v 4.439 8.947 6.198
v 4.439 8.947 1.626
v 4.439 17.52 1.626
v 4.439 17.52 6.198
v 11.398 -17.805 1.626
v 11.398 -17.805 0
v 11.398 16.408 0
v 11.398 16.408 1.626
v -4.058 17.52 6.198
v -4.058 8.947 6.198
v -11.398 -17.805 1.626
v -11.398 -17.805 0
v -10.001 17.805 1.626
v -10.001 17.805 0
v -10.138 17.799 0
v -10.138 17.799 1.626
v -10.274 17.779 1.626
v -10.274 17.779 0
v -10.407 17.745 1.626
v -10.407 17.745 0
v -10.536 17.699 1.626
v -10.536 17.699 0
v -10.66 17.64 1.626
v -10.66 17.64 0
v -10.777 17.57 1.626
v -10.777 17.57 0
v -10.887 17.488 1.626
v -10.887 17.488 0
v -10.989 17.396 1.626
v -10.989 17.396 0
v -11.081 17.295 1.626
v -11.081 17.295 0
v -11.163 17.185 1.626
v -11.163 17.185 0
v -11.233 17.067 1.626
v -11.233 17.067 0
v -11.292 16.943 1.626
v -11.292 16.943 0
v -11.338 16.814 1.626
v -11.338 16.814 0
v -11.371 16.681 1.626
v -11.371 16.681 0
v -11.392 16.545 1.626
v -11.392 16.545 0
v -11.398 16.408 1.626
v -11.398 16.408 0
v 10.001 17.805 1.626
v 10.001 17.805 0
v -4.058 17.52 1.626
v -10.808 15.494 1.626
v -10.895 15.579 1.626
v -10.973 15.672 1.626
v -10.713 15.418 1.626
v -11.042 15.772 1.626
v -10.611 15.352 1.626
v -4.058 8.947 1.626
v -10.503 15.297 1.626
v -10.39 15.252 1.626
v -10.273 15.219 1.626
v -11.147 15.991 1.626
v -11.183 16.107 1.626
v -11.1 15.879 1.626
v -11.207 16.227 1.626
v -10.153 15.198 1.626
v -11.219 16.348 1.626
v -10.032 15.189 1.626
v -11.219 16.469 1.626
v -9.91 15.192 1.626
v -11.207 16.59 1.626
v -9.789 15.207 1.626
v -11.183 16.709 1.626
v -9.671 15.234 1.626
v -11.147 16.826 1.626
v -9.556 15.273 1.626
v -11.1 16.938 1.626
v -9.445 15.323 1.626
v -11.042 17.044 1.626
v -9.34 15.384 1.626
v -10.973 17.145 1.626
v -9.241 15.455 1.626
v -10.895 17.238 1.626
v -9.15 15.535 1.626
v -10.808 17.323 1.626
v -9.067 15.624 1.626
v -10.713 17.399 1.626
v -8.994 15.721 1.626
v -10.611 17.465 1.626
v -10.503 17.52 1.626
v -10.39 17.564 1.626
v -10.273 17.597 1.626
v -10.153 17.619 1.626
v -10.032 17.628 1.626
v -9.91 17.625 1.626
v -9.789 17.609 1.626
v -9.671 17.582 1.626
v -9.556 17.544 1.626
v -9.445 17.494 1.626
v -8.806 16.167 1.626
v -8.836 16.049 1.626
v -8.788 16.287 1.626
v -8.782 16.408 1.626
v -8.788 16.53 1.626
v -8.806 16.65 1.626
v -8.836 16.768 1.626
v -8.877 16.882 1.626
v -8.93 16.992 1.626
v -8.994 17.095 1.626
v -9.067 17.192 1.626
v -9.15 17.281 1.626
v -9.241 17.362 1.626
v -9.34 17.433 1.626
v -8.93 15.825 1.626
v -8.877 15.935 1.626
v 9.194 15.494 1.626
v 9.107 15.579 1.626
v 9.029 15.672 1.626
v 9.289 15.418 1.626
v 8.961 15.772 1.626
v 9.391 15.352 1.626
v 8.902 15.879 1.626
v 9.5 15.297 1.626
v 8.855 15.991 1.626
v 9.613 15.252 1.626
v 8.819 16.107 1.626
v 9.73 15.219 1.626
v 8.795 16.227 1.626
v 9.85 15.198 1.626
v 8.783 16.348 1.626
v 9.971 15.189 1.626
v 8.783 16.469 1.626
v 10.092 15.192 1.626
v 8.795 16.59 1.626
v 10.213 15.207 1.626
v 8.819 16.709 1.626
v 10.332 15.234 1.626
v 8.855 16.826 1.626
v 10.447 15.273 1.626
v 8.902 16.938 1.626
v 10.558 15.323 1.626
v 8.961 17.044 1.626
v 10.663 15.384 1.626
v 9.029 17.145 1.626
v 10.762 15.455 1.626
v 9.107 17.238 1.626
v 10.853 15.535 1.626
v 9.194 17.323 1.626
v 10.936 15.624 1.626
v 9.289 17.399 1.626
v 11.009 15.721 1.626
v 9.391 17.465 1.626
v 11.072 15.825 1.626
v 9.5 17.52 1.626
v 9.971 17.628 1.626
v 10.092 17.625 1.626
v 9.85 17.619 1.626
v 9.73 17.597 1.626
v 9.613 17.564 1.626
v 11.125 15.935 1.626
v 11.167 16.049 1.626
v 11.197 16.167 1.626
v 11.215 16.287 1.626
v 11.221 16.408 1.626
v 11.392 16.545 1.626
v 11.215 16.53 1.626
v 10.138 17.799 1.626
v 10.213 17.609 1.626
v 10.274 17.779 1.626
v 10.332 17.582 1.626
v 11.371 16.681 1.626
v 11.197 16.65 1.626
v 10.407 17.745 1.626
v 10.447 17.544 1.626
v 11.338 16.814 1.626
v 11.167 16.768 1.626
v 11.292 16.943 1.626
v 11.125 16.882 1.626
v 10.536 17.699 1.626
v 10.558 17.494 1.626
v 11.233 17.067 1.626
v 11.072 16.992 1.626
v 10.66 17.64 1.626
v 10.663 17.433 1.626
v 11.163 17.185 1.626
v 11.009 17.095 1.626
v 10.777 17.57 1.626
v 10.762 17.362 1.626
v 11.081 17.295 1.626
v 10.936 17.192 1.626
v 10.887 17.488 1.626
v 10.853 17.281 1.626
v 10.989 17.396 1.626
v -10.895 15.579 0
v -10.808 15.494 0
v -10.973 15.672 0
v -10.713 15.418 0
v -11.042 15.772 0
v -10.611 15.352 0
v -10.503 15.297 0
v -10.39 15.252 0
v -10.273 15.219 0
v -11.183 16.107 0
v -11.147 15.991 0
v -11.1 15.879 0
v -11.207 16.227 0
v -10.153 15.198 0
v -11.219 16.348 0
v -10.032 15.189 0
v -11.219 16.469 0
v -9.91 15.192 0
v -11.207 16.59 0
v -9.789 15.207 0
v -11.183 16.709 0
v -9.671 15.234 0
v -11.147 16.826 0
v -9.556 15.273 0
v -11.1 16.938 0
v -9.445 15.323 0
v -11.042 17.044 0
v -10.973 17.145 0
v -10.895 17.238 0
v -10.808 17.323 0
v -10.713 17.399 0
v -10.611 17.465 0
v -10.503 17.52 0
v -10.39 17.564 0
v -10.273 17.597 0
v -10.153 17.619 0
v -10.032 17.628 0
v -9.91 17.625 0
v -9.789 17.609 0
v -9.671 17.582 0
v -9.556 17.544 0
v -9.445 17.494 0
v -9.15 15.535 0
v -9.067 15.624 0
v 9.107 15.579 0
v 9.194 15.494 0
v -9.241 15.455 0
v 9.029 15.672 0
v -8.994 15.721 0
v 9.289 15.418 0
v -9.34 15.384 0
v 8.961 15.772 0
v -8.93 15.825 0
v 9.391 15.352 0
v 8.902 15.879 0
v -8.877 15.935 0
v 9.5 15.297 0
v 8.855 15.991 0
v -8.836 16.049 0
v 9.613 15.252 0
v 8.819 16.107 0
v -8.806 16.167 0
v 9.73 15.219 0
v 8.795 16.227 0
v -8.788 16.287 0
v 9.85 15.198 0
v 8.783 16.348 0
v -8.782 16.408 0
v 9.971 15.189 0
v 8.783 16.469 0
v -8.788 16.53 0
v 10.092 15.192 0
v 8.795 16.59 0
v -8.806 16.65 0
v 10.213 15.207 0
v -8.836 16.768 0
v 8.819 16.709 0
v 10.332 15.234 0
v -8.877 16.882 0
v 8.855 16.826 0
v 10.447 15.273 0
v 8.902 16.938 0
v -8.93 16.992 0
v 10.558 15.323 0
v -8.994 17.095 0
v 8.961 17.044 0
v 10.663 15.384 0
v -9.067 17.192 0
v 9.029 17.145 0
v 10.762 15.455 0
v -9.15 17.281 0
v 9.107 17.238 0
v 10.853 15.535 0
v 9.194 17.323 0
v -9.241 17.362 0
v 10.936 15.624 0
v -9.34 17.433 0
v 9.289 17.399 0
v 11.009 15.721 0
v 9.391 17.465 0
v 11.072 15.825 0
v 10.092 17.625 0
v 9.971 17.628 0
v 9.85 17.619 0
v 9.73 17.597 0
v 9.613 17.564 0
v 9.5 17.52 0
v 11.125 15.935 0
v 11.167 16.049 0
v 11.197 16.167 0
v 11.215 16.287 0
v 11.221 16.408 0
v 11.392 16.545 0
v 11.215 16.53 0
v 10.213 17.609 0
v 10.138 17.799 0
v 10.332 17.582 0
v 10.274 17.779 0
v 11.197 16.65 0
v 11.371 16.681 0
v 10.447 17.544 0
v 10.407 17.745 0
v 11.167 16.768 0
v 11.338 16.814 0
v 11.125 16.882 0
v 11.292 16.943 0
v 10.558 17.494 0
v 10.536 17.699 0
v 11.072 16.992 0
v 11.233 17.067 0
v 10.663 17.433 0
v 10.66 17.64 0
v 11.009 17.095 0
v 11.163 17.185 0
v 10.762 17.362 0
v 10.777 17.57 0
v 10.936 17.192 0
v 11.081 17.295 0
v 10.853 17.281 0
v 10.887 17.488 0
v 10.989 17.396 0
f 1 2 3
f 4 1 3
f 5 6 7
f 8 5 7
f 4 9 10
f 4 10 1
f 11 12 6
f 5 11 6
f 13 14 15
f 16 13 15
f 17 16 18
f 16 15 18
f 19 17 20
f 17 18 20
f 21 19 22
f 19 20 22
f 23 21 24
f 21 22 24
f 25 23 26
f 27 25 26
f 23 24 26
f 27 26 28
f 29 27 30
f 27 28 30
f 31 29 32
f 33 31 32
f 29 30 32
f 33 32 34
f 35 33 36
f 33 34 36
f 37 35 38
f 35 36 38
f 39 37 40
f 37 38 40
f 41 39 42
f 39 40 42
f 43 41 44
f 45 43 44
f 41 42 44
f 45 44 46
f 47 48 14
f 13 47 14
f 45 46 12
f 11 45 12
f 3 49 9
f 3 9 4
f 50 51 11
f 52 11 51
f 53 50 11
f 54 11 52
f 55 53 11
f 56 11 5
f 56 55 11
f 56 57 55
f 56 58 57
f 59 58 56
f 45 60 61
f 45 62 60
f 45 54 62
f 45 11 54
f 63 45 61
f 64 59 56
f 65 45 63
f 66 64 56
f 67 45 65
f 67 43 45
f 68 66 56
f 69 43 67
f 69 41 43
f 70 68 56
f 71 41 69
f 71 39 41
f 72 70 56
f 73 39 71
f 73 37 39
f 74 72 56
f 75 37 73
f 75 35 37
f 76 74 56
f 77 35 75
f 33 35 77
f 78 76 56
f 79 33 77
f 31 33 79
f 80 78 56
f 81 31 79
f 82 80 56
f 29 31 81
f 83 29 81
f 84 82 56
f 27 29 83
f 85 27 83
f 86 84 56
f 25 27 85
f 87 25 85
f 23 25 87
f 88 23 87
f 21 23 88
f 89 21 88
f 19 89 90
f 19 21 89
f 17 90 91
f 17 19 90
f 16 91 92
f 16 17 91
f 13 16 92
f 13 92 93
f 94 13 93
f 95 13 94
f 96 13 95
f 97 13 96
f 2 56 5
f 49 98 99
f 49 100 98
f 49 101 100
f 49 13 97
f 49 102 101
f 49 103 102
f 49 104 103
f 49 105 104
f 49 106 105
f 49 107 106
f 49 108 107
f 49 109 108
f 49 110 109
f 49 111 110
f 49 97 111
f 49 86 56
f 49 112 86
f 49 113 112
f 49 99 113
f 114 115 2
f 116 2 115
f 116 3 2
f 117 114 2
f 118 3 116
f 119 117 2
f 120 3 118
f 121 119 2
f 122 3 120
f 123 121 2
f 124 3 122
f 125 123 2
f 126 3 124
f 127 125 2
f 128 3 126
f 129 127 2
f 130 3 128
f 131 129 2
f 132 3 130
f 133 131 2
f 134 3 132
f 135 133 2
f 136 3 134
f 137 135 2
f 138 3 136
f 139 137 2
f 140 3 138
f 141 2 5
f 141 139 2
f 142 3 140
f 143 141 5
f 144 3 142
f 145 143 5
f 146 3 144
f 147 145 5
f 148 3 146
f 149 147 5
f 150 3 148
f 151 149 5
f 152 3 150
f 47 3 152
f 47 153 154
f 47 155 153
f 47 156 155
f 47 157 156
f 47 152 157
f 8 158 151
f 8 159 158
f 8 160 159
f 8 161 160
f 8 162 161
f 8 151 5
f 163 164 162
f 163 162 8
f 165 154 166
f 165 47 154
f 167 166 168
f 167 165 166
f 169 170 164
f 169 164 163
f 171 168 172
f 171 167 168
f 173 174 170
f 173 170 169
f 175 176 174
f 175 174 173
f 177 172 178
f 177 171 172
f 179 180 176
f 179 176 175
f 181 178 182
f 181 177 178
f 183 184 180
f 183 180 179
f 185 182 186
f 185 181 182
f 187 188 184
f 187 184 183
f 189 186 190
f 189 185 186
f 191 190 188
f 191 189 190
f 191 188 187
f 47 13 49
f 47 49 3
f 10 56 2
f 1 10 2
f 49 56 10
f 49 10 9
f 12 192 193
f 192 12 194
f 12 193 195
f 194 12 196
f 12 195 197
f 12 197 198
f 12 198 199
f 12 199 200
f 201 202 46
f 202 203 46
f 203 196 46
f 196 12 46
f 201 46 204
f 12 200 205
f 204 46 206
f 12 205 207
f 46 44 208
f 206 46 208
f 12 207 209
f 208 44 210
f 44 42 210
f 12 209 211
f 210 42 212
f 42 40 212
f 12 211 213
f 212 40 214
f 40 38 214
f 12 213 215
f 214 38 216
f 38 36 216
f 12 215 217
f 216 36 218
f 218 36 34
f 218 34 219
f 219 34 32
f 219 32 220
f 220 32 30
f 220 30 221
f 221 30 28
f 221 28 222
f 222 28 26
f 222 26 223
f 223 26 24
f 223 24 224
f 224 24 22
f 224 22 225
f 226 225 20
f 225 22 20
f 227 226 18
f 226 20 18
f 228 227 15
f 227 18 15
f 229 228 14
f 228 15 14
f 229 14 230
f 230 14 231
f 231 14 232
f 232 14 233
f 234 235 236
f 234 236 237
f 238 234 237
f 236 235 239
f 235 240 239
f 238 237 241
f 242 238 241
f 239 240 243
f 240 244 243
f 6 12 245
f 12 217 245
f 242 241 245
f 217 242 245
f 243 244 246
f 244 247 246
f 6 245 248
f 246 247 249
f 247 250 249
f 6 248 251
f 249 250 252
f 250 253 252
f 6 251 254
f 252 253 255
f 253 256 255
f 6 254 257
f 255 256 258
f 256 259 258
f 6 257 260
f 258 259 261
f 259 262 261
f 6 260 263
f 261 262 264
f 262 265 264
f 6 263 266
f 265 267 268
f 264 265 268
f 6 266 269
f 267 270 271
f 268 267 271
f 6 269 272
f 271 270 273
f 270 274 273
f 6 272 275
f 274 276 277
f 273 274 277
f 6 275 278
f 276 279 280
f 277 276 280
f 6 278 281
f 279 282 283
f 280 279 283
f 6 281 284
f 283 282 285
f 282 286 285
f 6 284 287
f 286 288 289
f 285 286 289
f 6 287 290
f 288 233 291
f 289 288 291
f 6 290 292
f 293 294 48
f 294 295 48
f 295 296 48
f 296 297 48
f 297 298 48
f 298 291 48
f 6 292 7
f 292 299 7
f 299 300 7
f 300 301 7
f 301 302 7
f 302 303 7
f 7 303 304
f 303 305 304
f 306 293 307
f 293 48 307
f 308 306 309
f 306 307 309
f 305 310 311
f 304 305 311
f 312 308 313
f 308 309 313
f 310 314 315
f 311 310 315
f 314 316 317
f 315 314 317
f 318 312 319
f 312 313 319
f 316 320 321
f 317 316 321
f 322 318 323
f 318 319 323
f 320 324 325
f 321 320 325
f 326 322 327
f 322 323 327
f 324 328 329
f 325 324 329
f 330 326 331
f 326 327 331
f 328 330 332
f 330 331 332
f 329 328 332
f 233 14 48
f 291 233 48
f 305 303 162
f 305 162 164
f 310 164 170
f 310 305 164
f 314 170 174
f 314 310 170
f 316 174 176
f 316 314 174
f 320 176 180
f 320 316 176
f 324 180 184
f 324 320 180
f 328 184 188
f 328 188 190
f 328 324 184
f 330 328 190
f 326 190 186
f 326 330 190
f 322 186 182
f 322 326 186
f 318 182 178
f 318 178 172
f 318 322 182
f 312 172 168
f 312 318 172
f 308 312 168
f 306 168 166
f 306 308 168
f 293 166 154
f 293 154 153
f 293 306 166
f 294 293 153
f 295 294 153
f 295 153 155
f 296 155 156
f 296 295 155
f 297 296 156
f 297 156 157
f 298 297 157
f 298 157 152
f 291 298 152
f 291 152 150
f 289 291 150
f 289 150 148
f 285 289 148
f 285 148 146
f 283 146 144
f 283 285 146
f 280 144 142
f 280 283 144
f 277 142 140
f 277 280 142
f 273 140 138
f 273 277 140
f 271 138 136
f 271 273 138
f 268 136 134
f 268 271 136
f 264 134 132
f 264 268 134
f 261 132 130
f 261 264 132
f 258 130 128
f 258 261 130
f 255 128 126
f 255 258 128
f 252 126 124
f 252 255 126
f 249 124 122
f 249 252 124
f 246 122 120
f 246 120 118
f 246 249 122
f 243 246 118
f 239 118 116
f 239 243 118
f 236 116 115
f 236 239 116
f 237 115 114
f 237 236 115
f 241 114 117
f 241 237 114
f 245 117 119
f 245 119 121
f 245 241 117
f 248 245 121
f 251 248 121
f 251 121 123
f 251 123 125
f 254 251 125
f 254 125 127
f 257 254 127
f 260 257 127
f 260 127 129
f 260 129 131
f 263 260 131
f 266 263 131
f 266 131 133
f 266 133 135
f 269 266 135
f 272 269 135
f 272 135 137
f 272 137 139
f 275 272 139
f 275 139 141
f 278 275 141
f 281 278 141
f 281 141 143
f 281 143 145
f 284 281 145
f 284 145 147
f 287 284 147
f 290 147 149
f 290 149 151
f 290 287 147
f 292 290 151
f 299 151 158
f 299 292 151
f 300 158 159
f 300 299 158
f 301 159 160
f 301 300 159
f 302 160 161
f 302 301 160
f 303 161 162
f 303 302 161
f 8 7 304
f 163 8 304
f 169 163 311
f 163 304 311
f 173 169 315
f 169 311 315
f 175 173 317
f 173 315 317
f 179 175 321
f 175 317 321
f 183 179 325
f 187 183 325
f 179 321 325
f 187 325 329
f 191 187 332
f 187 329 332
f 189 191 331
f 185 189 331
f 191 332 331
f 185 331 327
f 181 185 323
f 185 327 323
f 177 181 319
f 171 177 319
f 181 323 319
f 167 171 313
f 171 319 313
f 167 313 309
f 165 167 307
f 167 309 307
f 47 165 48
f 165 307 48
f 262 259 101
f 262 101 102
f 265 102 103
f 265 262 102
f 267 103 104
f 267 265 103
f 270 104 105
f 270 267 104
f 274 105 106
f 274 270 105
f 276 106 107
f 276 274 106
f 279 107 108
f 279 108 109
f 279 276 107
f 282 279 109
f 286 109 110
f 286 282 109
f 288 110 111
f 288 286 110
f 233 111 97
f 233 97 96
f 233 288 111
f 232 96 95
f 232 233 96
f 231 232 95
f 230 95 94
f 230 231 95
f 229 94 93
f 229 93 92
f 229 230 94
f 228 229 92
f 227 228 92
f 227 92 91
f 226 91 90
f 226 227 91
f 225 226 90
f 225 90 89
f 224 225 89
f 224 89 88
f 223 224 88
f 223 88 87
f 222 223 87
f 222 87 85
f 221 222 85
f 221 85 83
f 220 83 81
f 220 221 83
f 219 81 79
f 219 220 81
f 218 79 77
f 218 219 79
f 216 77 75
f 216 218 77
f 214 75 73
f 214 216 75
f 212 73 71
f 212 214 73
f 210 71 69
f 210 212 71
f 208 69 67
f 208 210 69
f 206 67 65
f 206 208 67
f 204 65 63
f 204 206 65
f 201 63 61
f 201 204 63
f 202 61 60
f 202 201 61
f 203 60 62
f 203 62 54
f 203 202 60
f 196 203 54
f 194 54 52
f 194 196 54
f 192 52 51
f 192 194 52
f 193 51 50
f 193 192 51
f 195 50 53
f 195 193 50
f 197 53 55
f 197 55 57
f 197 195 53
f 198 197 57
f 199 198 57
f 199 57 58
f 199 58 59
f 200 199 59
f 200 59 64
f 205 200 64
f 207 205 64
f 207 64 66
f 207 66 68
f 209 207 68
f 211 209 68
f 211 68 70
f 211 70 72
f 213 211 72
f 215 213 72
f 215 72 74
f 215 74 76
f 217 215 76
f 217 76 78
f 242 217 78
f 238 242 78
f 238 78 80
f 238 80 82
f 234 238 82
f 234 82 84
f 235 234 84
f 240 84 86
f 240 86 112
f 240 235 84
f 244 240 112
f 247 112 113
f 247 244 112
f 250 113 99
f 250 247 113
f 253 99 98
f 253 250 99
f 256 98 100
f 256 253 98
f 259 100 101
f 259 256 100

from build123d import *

# Parameters (mm, degrees)
SKETCH1_R           = 1.219603507
BOSS_EXTRUDE1_DEPTH = 1.6256
SKETCH2_W           = 8.4963
SKETCH2_H           = 8.5725
BOSS_EXTRUDE2_DEPTH = 4.572


with BuildPart() as part:
    # Sketch1 → Boss-Extrude1 (new body)
    with BuildSketch(Plane.XY):
        with BuildLine():
            Line((-11.39825, -17.8054), (11.39825, -17.8054))
            Line((11.39825, -17.8054), (11.39825, 16.4084))
            ThreePointArc((11.39825, 16.4084), (10.989078173, 17.396228173), (10.00125, 17.8054))
            Line((10.00125, 17.8054), (-10.00125, 17.8054))
            ThreePointArc((-10.00125, 17.8054), (-10.989078173, 17.396228173), (-11.39825, 16.4084))
            Line((-11.39825, 16.4084), (-11.39825, -17.8054))
        make_face()
        with Locations((-10.00125, 16.4084)):
            Circle(SKETCH1_R, mode=Mode.SUBTRACT)
        with Locations((10.00125, 16.4084)):
            Circle(SKETCH1_R, mode=Mode.SUBTRACT)
    extrude(amount=BOSS_EXTRUDE1_DEPTH)

    # Sketch2 → Boss-Extrude2 (add)
    with BuildSketch(Plane.XY.offset(1.6256)):
        with Locations((0.1905, 13.2334)):
            Rectangle(SKETCH2_W, SKETCH2_H)
    extrude(amount=BOSS_EXTRUDE2_DEPTH)


solid = part.part
